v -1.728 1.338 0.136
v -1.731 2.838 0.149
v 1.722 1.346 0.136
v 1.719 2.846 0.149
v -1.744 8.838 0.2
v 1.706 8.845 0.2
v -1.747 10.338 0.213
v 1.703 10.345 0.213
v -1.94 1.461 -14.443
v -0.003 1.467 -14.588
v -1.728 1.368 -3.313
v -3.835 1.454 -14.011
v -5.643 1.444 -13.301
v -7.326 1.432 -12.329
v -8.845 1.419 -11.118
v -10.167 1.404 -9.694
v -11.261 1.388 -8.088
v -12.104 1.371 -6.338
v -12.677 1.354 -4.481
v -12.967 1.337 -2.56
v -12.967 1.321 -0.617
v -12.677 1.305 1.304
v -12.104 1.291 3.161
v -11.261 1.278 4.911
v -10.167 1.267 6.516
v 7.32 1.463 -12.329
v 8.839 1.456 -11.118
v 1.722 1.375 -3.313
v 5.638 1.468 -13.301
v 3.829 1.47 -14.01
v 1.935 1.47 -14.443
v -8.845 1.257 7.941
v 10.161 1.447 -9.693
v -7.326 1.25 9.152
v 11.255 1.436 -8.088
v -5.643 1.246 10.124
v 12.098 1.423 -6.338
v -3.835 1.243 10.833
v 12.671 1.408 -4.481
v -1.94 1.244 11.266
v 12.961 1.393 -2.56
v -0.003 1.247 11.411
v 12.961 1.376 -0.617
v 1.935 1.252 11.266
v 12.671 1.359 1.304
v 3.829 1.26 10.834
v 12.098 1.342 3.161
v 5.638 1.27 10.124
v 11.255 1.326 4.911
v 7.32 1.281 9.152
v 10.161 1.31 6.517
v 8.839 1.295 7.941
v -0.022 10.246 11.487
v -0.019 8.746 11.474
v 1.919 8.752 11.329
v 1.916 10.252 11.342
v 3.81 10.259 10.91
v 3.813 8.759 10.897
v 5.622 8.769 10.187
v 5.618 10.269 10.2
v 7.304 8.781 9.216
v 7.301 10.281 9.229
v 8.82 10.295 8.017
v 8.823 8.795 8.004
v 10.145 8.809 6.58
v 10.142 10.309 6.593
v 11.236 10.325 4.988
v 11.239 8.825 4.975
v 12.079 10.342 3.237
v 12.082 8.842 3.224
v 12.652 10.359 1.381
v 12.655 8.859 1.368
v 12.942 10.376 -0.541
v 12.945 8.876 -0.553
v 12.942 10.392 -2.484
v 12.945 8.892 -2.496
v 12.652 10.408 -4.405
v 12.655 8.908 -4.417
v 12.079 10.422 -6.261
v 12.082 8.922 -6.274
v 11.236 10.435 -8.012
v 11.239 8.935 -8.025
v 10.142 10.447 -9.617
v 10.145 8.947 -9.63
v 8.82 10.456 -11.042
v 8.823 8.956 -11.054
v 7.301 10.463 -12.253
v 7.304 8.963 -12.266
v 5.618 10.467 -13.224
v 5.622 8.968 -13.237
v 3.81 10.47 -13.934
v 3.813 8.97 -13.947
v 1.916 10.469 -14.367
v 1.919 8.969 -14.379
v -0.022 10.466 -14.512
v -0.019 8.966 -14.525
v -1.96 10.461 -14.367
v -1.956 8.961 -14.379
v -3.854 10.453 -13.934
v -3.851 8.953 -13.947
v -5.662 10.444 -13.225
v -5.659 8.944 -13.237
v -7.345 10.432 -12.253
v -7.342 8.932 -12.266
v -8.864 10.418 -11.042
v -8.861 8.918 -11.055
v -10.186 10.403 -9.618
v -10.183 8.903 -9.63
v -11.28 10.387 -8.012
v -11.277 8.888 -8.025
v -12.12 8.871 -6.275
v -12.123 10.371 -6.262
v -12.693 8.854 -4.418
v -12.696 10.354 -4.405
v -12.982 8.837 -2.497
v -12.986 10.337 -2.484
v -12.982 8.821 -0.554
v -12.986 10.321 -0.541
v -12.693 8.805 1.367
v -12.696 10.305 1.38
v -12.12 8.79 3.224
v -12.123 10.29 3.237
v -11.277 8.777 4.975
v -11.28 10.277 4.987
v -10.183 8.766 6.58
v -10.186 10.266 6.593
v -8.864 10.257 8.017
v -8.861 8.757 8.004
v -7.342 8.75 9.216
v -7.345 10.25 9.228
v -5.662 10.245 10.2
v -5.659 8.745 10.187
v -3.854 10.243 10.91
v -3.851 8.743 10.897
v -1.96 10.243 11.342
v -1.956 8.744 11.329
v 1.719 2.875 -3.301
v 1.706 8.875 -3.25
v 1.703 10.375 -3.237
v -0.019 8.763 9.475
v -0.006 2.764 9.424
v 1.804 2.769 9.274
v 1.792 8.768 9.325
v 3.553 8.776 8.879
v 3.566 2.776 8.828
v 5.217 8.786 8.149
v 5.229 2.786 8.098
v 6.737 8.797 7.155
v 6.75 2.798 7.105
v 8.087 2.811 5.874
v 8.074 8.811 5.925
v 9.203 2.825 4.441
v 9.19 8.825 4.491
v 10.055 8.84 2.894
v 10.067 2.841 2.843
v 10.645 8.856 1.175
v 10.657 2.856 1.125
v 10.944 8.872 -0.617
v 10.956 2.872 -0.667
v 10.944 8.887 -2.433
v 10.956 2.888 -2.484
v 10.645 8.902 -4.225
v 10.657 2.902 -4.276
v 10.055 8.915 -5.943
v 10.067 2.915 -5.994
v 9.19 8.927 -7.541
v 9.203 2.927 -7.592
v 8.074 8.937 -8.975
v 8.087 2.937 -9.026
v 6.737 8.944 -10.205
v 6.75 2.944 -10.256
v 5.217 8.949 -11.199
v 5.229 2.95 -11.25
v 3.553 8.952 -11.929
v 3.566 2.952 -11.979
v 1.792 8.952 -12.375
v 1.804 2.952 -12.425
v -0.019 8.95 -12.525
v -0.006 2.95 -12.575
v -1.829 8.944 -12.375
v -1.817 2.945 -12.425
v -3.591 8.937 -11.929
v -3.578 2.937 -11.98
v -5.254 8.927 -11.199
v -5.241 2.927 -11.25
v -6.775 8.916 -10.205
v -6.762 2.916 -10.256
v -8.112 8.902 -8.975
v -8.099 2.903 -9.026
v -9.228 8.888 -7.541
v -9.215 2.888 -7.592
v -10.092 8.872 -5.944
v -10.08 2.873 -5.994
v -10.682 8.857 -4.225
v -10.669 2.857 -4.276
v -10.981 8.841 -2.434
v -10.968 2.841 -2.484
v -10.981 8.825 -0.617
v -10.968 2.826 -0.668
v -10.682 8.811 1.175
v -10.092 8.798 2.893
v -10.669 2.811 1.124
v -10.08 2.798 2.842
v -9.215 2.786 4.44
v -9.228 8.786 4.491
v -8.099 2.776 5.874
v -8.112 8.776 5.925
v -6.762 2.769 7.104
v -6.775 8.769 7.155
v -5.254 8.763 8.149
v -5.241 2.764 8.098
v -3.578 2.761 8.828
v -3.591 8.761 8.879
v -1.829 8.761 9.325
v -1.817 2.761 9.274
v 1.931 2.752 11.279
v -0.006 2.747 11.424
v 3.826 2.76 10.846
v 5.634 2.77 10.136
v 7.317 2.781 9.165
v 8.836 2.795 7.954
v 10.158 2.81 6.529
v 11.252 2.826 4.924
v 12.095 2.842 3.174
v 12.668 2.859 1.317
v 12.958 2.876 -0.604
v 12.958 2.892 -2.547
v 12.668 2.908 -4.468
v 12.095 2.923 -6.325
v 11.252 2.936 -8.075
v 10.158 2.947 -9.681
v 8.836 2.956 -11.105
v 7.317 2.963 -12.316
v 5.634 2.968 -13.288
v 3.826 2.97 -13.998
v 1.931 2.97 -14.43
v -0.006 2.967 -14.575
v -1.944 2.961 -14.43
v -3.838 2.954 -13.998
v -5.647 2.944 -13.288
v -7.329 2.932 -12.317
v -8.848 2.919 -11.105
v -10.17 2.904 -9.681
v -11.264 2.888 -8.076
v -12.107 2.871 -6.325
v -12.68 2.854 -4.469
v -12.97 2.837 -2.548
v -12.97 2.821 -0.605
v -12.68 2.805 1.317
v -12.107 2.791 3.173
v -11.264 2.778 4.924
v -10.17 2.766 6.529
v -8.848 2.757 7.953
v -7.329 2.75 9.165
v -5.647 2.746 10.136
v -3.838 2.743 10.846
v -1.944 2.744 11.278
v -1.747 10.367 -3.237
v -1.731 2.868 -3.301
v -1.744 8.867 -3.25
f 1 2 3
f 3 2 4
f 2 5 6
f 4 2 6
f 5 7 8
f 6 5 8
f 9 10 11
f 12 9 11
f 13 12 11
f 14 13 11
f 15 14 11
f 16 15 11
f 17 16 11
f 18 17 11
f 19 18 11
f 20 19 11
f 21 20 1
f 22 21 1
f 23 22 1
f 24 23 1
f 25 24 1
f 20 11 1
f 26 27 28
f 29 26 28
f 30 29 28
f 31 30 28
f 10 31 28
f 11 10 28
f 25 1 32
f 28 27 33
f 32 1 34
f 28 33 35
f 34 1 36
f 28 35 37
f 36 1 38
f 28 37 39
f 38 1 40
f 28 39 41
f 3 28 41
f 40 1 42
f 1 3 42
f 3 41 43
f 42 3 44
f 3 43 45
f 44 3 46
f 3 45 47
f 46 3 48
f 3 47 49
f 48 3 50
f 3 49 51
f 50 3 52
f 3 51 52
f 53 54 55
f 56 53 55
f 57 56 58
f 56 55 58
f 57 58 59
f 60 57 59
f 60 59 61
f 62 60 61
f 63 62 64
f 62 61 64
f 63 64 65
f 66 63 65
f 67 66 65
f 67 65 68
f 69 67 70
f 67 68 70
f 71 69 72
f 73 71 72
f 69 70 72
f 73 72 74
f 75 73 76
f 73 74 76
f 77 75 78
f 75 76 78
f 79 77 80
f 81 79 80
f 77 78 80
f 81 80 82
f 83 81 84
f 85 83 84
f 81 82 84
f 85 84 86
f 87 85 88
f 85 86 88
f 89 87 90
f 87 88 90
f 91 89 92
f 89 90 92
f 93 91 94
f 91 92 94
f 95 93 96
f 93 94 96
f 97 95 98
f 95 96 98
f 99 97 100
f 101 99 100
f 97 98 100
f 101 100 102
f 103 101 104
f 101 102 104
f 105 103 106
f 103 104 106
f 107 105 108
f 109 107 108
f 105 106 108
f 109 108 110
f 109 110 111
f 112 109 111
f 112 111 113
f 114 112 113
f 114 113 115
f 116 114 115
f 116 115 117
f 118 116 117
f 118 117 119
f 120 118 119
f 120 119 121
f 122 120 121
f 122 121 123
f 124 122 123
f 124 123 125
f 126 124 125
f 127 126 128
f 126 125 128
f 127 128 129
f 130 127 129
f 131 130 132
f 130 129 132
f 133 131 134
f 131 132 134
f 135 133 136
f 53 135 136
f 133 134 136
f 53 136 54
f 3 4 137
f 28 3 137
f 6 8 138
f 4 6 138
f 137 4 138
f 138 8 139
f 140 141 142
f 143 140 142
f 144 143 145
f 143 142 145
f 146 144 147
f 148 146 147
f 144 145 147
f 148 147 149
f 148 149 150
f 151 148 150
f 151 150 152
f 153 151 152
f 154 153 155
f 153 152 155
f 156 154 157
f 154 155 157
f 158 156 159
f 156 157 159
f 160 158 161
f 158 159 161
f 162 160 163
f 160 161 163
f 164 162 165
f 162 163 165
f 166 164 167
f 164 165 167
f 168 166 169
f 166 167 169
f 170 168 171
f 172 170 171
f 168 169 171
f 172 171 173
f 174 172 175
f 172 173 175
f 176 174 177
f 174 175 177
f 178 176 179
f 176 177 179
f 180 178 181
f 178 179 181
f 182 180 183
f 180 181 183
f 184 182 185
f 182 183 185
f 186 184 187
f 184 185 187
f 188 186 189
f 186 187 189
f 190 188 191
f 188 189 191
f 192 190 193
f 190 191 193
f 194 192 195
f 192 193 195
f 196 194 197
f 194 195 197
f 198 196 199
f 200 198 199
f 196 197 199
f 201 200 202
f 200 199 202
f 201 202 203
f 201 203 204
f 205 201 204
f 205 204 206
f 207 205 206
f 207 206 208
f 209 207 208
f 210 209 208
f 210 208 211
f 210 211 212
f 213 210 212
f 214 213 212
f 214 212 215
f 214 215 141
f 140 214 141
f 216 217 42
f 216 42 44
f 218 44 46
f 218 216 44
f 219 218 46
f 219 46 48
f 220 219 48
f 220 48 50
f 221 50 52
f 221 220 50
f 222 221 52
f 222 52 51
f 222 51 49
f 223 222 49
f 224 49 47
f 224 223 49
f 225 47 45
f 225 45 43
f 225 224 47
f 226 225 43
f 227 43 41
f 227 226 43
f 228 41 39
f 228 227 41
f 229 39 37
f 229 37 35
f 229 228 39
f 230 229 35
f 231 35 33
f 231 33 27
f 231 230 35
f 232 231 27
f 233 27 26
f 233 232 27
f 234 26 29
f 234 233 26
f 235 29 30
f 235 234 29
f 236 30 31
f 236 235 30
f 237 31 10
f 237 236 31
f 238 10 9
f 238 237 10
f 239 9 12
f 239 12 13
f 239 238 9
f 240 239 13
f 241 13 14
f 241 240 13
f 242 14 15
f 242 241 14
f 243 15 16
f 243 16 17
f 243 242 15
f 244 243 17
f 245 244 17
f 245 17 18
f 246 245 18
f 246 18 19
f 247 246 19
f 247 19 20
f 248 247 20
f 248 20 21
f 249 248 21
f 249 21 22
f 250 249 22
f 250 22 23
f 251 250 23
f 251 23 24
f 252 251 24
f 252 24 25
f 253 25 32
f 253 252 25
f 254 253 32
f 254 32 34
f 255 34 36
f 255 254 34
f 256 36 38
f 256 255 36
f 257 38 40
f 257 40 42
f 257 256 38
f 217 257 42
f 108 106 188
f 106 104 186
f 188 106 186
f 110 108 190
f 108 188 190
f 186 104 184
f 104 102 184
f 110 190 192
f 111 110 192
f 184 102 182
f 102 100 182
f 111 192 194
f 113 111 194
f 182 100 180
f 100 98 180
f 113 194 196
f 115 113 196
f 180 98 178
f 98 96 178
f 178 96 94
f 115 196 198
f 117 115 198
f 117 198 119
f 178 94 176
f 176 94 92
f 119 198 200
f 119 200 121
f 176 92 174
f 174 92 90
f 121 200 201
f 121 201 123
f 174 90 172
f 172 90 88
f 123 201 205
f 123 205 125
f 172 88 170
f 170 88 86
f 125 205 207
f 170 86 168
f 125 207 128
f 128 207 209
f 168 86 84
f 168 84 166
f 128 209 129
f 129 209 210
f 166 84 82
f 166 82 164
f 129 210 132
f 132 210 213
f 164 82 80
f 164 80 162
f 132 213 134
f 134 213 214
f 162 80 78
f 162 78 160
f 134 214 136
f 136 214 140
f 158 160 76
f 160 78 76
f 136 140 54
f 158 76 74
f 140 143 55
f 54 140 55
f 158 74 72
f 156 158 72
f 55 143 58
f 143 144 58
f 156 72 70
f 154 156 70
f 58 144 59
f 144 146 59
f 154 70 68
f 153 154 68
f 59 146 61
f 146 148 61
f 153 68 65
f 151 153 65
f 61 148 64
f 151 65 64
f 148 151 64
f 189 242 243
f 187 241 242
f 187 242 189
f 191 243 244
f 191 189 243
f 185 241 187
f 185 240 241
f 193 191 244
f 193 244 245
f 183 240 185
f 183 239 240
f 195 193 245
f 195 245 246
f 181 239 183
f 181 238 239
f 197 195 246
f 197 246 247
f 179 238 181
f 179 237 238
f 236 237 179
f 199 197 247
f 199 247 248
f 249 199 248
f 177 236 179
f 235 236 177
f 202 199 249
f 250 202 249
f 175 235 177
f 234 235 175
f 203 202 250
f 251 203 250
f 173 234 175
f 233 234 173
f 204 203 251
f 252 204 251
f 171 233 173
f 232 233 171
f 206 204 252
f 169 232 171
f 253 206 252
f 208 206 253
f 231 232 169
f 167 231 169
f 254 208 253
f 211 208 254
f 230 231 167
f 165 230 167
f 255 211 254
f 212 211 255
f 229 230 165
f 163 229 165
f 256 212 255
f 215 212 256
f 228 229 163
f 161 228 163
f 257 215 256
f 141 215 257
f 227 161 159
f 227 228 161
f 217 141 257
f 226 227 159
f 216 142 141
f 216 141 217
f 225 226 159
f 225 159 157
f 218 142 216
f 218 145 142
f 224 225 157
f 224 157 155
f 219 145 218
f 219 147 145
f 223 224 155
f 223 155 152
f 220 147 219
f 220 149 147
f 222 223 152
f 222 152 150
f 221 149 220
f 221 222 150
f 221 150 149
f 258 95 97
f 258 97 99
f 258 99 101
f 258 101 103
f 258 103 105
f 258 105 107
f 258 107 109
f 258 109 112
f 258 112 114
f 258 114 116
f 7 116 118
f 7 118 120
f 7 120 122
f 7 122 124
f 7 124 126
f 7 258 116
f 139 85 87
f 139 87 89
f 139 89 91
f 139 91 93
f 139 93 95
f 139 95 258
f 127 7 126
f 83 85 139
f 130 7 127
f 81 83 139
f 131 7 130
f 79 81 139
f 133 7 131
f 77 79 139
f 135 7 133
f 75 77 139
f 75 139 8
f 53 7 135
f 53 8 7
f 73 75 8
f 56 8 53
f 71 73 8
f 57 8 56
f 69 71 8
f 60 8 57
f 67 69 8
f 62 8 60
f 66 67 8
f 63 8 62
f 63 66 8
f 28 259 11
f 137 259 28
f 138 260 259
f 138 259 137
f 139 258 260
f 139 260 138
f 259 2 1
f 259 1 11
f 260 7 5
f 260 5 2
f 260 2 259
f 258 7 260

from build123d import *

# Parameters (mm, degrees)
SKETCH2_R           = 11
BOSS_EXTRUDE1_DEPTH = 6
SKETCH3_W           = 3.45
SKETCH3_H           = 3.45
CUT_EXTRUDE1_DEPTH  = 18.841034143
SKETCH4_R           = 13
BOSS_EXTRUDE2_DEPTH = 1.5
SKETCH5_W           = 3.45
SKETCH5_H           = 3.45
CUT_EXTRUDE2_DEPTH  = 22.625712586


with BuildPart() as part:
    # Sketch2 → Boss-Extrude1 (new body)
    with BuildSketch(Plane(origin=(-0.006046198, 2.843115255, 0.024063532), x_dir=(0.9999977389340391, 0.002126453123543878, 1.7997853821493017e-05), z_dir=(-0.00212652928721231, 0.9999619230641714, 0.008463468260412206))):
        with Locations(Location((-2.8797e-05, 1.599942694, 0), (0, 0, 270))):
            Circle(SKETCH2_R)
    extrude(amount=BOSS_EXTRUDE1_DEPTH)

    # Sketch3 → Cut-Extrude1 (cut, through all)
    with BuildSketch(Plane(origin=(-0.018805374, 8.842886793, 0.074844342), x_dir=(0.9999977389340391, 0.002126453123543878, 1.7997853821493024e-05), z_dir=(-0.00212652928721231, 0.9999619230641714, 0.00846346826041221))):
        with Locations((-2.8797e-05, 1.599942694)):
            Rectangle(SKETCH3_W, SKETCH3_H)
    extrude(amount=-CUT_EXTRUDE1_DEPTH, mode=Mode.SUBTRACT)

    # Sketch4 → Boss-Extrude2 (add)
    with BuildSketch(Plane(origin=(-0.018805374, 8.842886793, 0.074844342), x_dir=(0.9999977389340391, 0.002126453123543878, 1.7997853821493024e-05), z_dir=(-0.00212652928721231, 0.9999619230641714, 0.00846346826041221))):
        with Locations(Location((-2.8797e-05, 1.599942694, 0), (0, 0, 270))):
            Circle(SKETCH4_R)
    boss_extrude2 = extrude(amount=BOSS_EXTRUDE2_DEPTH)

    # Mirror1: Boss-Extrude2 across plane
    add(boss_extrude2.mirror(Plane(origin=(-0.012425786, 5.843001024, 0.049453937), x_dir=(1.79984577561216e-05, -0.008463449122581367, 0.9999641842111171), z_dir=(0.00212652928721231, -0.9999619230641714, -0.00846346826041221))))

    # Sketch5 → Cut-Extrude2 (cut, through all)
    with BuildSketch(Plane(origin=(-0.021995168, 10.342829678, 0.087539544), x_dir=(0.9999977389340391, 0.002126453123543878, 1.799785382149303e-05), z_dir=(-0.00212652928721231, 0.9999619230641714, 0.008463468260412213))):
        with Locations((-2.8797e-05, 1.599942694)):
            Rectangle(SKETCH5_W, SKETCH5_H)
    extrude(amount=-CUT_EXTRUDE2_DEPTH, mode=Mode.SUBTRACT)


solid = part.part
